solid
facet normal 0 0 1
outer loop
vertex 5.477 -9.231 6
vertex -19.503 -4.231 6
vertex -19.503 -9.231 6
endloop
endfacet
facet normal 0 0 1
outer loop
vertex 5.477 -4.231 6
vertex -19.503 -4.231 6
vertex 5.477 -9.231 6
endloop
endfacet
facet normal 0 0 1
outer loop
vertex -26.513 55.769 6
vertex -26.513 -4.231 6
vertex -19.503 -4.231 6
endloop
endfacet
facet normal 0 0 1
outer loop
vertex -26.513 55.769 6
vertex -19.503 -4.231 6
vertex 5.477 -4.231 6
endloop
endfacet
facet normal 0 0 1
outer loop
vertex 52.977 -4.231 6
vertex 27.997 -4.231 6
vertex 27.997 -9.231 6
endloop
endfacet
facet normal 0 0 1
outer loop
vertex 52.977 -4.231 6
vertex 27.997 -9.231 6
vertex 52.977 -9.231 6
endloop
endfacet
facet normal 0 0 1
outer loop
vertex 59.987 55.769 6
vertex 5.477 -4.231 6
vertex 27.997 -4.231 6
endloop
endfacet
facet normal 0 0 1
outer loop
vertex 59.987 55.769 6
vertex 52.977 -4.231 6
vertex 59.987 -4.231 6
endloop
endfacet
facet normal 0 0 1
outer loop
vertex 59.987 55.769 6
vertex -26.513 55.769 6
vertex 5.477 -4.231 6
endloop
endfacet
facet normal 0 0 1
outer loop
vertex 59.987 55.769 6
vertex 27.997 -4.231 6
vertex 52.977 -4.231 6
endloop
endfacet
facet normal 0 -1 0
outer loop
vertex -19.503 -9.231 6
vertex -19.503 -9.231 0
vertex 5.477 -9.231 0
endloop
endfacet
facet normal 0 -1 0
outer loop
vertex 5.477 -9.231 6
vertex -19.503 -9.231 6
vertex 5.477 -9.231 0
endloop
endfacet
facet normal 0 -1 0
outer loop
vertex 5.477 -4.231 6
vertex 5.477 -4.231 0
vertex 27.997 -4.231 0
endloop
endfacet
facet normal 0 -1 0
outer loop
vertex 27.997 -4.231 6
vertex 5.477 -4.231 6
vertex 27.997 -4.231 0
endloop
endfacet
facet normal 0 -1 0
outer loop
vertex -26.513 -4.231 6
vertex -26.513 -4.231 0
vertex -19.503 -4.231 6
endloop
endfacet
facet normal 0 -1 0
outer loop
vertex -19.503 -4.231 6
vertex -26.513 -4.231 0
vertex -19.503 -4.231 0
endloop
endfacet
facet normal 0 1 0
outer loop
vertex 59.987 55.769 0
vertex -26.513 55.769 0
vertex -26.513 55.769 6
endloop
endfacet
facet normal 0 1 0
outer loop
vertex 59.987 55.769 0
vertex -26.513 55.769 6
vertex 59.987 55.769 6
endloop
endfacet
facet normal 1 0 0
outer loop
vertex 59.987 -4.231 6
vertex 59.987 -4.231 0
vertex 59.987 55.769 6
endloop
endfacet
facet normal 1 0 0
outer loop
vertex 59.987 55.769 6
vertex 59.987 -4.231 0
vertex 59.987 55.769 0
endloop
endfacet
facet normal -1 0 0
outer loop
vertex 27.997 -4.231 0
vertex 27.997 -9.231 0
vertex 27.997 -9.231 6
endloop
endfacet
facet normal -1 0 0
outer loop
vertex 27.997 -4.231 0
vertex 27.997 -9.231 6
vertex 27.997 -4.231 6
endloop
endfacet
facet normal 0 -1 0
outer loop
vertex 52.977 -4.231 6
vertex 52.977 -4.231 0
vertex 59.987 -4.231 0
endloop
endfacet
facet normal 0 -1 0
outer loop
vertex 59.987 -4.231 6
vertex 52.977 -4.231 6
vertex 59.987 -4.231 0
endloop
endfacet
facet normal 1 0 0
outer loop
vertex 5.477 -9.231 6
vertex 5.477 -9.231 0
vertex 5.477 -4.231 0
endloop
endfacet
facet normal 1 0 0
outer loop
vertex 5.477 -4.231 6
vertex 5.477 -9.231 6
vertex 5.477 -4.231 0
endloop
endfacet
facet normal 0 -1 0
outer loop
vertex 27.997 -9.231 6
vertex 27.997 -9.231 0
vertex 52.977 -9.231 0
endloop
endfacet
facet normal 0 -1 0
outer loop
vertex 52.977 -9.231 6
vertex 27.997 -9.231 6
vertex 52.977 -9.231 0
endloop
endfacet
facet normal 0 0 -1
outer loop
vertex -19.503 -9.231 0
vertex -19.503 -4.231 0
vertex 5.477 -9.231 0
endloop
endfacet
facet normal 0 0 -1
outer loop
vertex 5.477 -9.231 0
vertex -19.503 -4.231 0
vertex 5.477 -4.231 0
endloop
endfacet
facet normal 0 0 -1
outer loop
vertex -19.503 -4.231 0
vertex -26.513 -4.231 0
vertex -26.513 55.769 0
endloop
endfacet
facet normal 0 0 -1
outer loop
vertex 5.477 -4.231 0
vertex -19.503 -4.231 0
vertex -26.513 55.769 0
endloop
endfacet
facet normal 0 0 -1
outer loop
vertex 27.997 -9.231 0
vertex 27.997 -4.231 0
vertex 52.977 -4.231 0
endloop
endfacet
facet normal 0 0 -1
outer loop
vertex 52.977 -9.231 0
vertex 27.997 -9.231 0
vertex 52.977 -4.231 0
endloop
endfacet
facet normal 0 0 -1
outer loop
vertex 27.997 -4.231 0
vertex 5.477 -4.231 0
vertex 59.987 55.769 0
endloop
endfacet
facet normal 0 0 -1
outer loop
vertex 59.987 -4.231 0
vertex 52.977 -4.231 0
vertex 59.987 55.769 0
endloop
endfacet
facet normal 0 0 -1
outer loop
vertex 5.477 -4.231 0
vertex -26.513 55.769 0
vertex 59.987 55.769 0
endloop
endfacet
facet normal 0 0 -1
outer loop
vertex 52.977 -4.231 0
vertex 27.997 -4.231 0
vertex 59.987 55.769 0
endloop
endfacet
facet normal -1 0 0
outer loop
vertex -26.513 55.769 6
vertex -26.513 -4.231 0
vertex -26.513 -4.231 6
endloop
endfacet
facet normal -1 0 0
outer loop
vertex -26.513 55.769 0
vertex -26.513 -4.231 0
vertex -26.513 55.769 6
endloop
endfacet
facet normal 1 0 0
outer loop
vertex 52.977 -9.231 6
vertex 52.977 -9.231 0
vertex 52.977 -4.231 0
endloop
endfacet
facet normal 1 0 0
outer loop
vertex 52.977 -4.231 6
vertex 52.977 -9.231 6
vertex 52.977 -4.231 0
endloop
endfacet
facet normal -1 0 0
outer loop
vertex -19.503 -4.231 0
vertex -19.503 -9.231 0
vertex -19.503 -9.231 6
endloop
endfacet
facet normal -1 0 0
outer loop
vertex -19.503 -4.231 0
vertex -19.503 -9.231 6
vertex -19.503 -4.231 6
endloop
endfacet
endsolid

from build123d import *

# Parameters (mm, degrees)
ESQUISSE1_W        = 86.5
ESQUISSE1_H        = 60
ESQUISSE1_W_2      = 24.98
ESQUISSE1_H_2      = 5
BOSS_EXTRU_1_DEPTH = 6


with BuildPart() as part:
    # Esquisse1 → Boss.-Extru.1 (new body)
    with BuildSketch(Plane.XY):
        with Locations((16.736924874, 25.769230769)):
            Rectangle(ESQUISSE1_W, ESQUISSE1_H)
        with Locations((-7.013075126, -6.730769231)):
            Rectangle(ESQUISSE1_W_2, ESQUISSE1_H_2)
        with Locations((40.486924874, -6.730769231)):
            Rectangle(ESQUISSE1_W_2, ESQUISSE1_H_2)
    extrude(amount=BOSS_EXTRU_1_DEPTH)


solid = part.part
